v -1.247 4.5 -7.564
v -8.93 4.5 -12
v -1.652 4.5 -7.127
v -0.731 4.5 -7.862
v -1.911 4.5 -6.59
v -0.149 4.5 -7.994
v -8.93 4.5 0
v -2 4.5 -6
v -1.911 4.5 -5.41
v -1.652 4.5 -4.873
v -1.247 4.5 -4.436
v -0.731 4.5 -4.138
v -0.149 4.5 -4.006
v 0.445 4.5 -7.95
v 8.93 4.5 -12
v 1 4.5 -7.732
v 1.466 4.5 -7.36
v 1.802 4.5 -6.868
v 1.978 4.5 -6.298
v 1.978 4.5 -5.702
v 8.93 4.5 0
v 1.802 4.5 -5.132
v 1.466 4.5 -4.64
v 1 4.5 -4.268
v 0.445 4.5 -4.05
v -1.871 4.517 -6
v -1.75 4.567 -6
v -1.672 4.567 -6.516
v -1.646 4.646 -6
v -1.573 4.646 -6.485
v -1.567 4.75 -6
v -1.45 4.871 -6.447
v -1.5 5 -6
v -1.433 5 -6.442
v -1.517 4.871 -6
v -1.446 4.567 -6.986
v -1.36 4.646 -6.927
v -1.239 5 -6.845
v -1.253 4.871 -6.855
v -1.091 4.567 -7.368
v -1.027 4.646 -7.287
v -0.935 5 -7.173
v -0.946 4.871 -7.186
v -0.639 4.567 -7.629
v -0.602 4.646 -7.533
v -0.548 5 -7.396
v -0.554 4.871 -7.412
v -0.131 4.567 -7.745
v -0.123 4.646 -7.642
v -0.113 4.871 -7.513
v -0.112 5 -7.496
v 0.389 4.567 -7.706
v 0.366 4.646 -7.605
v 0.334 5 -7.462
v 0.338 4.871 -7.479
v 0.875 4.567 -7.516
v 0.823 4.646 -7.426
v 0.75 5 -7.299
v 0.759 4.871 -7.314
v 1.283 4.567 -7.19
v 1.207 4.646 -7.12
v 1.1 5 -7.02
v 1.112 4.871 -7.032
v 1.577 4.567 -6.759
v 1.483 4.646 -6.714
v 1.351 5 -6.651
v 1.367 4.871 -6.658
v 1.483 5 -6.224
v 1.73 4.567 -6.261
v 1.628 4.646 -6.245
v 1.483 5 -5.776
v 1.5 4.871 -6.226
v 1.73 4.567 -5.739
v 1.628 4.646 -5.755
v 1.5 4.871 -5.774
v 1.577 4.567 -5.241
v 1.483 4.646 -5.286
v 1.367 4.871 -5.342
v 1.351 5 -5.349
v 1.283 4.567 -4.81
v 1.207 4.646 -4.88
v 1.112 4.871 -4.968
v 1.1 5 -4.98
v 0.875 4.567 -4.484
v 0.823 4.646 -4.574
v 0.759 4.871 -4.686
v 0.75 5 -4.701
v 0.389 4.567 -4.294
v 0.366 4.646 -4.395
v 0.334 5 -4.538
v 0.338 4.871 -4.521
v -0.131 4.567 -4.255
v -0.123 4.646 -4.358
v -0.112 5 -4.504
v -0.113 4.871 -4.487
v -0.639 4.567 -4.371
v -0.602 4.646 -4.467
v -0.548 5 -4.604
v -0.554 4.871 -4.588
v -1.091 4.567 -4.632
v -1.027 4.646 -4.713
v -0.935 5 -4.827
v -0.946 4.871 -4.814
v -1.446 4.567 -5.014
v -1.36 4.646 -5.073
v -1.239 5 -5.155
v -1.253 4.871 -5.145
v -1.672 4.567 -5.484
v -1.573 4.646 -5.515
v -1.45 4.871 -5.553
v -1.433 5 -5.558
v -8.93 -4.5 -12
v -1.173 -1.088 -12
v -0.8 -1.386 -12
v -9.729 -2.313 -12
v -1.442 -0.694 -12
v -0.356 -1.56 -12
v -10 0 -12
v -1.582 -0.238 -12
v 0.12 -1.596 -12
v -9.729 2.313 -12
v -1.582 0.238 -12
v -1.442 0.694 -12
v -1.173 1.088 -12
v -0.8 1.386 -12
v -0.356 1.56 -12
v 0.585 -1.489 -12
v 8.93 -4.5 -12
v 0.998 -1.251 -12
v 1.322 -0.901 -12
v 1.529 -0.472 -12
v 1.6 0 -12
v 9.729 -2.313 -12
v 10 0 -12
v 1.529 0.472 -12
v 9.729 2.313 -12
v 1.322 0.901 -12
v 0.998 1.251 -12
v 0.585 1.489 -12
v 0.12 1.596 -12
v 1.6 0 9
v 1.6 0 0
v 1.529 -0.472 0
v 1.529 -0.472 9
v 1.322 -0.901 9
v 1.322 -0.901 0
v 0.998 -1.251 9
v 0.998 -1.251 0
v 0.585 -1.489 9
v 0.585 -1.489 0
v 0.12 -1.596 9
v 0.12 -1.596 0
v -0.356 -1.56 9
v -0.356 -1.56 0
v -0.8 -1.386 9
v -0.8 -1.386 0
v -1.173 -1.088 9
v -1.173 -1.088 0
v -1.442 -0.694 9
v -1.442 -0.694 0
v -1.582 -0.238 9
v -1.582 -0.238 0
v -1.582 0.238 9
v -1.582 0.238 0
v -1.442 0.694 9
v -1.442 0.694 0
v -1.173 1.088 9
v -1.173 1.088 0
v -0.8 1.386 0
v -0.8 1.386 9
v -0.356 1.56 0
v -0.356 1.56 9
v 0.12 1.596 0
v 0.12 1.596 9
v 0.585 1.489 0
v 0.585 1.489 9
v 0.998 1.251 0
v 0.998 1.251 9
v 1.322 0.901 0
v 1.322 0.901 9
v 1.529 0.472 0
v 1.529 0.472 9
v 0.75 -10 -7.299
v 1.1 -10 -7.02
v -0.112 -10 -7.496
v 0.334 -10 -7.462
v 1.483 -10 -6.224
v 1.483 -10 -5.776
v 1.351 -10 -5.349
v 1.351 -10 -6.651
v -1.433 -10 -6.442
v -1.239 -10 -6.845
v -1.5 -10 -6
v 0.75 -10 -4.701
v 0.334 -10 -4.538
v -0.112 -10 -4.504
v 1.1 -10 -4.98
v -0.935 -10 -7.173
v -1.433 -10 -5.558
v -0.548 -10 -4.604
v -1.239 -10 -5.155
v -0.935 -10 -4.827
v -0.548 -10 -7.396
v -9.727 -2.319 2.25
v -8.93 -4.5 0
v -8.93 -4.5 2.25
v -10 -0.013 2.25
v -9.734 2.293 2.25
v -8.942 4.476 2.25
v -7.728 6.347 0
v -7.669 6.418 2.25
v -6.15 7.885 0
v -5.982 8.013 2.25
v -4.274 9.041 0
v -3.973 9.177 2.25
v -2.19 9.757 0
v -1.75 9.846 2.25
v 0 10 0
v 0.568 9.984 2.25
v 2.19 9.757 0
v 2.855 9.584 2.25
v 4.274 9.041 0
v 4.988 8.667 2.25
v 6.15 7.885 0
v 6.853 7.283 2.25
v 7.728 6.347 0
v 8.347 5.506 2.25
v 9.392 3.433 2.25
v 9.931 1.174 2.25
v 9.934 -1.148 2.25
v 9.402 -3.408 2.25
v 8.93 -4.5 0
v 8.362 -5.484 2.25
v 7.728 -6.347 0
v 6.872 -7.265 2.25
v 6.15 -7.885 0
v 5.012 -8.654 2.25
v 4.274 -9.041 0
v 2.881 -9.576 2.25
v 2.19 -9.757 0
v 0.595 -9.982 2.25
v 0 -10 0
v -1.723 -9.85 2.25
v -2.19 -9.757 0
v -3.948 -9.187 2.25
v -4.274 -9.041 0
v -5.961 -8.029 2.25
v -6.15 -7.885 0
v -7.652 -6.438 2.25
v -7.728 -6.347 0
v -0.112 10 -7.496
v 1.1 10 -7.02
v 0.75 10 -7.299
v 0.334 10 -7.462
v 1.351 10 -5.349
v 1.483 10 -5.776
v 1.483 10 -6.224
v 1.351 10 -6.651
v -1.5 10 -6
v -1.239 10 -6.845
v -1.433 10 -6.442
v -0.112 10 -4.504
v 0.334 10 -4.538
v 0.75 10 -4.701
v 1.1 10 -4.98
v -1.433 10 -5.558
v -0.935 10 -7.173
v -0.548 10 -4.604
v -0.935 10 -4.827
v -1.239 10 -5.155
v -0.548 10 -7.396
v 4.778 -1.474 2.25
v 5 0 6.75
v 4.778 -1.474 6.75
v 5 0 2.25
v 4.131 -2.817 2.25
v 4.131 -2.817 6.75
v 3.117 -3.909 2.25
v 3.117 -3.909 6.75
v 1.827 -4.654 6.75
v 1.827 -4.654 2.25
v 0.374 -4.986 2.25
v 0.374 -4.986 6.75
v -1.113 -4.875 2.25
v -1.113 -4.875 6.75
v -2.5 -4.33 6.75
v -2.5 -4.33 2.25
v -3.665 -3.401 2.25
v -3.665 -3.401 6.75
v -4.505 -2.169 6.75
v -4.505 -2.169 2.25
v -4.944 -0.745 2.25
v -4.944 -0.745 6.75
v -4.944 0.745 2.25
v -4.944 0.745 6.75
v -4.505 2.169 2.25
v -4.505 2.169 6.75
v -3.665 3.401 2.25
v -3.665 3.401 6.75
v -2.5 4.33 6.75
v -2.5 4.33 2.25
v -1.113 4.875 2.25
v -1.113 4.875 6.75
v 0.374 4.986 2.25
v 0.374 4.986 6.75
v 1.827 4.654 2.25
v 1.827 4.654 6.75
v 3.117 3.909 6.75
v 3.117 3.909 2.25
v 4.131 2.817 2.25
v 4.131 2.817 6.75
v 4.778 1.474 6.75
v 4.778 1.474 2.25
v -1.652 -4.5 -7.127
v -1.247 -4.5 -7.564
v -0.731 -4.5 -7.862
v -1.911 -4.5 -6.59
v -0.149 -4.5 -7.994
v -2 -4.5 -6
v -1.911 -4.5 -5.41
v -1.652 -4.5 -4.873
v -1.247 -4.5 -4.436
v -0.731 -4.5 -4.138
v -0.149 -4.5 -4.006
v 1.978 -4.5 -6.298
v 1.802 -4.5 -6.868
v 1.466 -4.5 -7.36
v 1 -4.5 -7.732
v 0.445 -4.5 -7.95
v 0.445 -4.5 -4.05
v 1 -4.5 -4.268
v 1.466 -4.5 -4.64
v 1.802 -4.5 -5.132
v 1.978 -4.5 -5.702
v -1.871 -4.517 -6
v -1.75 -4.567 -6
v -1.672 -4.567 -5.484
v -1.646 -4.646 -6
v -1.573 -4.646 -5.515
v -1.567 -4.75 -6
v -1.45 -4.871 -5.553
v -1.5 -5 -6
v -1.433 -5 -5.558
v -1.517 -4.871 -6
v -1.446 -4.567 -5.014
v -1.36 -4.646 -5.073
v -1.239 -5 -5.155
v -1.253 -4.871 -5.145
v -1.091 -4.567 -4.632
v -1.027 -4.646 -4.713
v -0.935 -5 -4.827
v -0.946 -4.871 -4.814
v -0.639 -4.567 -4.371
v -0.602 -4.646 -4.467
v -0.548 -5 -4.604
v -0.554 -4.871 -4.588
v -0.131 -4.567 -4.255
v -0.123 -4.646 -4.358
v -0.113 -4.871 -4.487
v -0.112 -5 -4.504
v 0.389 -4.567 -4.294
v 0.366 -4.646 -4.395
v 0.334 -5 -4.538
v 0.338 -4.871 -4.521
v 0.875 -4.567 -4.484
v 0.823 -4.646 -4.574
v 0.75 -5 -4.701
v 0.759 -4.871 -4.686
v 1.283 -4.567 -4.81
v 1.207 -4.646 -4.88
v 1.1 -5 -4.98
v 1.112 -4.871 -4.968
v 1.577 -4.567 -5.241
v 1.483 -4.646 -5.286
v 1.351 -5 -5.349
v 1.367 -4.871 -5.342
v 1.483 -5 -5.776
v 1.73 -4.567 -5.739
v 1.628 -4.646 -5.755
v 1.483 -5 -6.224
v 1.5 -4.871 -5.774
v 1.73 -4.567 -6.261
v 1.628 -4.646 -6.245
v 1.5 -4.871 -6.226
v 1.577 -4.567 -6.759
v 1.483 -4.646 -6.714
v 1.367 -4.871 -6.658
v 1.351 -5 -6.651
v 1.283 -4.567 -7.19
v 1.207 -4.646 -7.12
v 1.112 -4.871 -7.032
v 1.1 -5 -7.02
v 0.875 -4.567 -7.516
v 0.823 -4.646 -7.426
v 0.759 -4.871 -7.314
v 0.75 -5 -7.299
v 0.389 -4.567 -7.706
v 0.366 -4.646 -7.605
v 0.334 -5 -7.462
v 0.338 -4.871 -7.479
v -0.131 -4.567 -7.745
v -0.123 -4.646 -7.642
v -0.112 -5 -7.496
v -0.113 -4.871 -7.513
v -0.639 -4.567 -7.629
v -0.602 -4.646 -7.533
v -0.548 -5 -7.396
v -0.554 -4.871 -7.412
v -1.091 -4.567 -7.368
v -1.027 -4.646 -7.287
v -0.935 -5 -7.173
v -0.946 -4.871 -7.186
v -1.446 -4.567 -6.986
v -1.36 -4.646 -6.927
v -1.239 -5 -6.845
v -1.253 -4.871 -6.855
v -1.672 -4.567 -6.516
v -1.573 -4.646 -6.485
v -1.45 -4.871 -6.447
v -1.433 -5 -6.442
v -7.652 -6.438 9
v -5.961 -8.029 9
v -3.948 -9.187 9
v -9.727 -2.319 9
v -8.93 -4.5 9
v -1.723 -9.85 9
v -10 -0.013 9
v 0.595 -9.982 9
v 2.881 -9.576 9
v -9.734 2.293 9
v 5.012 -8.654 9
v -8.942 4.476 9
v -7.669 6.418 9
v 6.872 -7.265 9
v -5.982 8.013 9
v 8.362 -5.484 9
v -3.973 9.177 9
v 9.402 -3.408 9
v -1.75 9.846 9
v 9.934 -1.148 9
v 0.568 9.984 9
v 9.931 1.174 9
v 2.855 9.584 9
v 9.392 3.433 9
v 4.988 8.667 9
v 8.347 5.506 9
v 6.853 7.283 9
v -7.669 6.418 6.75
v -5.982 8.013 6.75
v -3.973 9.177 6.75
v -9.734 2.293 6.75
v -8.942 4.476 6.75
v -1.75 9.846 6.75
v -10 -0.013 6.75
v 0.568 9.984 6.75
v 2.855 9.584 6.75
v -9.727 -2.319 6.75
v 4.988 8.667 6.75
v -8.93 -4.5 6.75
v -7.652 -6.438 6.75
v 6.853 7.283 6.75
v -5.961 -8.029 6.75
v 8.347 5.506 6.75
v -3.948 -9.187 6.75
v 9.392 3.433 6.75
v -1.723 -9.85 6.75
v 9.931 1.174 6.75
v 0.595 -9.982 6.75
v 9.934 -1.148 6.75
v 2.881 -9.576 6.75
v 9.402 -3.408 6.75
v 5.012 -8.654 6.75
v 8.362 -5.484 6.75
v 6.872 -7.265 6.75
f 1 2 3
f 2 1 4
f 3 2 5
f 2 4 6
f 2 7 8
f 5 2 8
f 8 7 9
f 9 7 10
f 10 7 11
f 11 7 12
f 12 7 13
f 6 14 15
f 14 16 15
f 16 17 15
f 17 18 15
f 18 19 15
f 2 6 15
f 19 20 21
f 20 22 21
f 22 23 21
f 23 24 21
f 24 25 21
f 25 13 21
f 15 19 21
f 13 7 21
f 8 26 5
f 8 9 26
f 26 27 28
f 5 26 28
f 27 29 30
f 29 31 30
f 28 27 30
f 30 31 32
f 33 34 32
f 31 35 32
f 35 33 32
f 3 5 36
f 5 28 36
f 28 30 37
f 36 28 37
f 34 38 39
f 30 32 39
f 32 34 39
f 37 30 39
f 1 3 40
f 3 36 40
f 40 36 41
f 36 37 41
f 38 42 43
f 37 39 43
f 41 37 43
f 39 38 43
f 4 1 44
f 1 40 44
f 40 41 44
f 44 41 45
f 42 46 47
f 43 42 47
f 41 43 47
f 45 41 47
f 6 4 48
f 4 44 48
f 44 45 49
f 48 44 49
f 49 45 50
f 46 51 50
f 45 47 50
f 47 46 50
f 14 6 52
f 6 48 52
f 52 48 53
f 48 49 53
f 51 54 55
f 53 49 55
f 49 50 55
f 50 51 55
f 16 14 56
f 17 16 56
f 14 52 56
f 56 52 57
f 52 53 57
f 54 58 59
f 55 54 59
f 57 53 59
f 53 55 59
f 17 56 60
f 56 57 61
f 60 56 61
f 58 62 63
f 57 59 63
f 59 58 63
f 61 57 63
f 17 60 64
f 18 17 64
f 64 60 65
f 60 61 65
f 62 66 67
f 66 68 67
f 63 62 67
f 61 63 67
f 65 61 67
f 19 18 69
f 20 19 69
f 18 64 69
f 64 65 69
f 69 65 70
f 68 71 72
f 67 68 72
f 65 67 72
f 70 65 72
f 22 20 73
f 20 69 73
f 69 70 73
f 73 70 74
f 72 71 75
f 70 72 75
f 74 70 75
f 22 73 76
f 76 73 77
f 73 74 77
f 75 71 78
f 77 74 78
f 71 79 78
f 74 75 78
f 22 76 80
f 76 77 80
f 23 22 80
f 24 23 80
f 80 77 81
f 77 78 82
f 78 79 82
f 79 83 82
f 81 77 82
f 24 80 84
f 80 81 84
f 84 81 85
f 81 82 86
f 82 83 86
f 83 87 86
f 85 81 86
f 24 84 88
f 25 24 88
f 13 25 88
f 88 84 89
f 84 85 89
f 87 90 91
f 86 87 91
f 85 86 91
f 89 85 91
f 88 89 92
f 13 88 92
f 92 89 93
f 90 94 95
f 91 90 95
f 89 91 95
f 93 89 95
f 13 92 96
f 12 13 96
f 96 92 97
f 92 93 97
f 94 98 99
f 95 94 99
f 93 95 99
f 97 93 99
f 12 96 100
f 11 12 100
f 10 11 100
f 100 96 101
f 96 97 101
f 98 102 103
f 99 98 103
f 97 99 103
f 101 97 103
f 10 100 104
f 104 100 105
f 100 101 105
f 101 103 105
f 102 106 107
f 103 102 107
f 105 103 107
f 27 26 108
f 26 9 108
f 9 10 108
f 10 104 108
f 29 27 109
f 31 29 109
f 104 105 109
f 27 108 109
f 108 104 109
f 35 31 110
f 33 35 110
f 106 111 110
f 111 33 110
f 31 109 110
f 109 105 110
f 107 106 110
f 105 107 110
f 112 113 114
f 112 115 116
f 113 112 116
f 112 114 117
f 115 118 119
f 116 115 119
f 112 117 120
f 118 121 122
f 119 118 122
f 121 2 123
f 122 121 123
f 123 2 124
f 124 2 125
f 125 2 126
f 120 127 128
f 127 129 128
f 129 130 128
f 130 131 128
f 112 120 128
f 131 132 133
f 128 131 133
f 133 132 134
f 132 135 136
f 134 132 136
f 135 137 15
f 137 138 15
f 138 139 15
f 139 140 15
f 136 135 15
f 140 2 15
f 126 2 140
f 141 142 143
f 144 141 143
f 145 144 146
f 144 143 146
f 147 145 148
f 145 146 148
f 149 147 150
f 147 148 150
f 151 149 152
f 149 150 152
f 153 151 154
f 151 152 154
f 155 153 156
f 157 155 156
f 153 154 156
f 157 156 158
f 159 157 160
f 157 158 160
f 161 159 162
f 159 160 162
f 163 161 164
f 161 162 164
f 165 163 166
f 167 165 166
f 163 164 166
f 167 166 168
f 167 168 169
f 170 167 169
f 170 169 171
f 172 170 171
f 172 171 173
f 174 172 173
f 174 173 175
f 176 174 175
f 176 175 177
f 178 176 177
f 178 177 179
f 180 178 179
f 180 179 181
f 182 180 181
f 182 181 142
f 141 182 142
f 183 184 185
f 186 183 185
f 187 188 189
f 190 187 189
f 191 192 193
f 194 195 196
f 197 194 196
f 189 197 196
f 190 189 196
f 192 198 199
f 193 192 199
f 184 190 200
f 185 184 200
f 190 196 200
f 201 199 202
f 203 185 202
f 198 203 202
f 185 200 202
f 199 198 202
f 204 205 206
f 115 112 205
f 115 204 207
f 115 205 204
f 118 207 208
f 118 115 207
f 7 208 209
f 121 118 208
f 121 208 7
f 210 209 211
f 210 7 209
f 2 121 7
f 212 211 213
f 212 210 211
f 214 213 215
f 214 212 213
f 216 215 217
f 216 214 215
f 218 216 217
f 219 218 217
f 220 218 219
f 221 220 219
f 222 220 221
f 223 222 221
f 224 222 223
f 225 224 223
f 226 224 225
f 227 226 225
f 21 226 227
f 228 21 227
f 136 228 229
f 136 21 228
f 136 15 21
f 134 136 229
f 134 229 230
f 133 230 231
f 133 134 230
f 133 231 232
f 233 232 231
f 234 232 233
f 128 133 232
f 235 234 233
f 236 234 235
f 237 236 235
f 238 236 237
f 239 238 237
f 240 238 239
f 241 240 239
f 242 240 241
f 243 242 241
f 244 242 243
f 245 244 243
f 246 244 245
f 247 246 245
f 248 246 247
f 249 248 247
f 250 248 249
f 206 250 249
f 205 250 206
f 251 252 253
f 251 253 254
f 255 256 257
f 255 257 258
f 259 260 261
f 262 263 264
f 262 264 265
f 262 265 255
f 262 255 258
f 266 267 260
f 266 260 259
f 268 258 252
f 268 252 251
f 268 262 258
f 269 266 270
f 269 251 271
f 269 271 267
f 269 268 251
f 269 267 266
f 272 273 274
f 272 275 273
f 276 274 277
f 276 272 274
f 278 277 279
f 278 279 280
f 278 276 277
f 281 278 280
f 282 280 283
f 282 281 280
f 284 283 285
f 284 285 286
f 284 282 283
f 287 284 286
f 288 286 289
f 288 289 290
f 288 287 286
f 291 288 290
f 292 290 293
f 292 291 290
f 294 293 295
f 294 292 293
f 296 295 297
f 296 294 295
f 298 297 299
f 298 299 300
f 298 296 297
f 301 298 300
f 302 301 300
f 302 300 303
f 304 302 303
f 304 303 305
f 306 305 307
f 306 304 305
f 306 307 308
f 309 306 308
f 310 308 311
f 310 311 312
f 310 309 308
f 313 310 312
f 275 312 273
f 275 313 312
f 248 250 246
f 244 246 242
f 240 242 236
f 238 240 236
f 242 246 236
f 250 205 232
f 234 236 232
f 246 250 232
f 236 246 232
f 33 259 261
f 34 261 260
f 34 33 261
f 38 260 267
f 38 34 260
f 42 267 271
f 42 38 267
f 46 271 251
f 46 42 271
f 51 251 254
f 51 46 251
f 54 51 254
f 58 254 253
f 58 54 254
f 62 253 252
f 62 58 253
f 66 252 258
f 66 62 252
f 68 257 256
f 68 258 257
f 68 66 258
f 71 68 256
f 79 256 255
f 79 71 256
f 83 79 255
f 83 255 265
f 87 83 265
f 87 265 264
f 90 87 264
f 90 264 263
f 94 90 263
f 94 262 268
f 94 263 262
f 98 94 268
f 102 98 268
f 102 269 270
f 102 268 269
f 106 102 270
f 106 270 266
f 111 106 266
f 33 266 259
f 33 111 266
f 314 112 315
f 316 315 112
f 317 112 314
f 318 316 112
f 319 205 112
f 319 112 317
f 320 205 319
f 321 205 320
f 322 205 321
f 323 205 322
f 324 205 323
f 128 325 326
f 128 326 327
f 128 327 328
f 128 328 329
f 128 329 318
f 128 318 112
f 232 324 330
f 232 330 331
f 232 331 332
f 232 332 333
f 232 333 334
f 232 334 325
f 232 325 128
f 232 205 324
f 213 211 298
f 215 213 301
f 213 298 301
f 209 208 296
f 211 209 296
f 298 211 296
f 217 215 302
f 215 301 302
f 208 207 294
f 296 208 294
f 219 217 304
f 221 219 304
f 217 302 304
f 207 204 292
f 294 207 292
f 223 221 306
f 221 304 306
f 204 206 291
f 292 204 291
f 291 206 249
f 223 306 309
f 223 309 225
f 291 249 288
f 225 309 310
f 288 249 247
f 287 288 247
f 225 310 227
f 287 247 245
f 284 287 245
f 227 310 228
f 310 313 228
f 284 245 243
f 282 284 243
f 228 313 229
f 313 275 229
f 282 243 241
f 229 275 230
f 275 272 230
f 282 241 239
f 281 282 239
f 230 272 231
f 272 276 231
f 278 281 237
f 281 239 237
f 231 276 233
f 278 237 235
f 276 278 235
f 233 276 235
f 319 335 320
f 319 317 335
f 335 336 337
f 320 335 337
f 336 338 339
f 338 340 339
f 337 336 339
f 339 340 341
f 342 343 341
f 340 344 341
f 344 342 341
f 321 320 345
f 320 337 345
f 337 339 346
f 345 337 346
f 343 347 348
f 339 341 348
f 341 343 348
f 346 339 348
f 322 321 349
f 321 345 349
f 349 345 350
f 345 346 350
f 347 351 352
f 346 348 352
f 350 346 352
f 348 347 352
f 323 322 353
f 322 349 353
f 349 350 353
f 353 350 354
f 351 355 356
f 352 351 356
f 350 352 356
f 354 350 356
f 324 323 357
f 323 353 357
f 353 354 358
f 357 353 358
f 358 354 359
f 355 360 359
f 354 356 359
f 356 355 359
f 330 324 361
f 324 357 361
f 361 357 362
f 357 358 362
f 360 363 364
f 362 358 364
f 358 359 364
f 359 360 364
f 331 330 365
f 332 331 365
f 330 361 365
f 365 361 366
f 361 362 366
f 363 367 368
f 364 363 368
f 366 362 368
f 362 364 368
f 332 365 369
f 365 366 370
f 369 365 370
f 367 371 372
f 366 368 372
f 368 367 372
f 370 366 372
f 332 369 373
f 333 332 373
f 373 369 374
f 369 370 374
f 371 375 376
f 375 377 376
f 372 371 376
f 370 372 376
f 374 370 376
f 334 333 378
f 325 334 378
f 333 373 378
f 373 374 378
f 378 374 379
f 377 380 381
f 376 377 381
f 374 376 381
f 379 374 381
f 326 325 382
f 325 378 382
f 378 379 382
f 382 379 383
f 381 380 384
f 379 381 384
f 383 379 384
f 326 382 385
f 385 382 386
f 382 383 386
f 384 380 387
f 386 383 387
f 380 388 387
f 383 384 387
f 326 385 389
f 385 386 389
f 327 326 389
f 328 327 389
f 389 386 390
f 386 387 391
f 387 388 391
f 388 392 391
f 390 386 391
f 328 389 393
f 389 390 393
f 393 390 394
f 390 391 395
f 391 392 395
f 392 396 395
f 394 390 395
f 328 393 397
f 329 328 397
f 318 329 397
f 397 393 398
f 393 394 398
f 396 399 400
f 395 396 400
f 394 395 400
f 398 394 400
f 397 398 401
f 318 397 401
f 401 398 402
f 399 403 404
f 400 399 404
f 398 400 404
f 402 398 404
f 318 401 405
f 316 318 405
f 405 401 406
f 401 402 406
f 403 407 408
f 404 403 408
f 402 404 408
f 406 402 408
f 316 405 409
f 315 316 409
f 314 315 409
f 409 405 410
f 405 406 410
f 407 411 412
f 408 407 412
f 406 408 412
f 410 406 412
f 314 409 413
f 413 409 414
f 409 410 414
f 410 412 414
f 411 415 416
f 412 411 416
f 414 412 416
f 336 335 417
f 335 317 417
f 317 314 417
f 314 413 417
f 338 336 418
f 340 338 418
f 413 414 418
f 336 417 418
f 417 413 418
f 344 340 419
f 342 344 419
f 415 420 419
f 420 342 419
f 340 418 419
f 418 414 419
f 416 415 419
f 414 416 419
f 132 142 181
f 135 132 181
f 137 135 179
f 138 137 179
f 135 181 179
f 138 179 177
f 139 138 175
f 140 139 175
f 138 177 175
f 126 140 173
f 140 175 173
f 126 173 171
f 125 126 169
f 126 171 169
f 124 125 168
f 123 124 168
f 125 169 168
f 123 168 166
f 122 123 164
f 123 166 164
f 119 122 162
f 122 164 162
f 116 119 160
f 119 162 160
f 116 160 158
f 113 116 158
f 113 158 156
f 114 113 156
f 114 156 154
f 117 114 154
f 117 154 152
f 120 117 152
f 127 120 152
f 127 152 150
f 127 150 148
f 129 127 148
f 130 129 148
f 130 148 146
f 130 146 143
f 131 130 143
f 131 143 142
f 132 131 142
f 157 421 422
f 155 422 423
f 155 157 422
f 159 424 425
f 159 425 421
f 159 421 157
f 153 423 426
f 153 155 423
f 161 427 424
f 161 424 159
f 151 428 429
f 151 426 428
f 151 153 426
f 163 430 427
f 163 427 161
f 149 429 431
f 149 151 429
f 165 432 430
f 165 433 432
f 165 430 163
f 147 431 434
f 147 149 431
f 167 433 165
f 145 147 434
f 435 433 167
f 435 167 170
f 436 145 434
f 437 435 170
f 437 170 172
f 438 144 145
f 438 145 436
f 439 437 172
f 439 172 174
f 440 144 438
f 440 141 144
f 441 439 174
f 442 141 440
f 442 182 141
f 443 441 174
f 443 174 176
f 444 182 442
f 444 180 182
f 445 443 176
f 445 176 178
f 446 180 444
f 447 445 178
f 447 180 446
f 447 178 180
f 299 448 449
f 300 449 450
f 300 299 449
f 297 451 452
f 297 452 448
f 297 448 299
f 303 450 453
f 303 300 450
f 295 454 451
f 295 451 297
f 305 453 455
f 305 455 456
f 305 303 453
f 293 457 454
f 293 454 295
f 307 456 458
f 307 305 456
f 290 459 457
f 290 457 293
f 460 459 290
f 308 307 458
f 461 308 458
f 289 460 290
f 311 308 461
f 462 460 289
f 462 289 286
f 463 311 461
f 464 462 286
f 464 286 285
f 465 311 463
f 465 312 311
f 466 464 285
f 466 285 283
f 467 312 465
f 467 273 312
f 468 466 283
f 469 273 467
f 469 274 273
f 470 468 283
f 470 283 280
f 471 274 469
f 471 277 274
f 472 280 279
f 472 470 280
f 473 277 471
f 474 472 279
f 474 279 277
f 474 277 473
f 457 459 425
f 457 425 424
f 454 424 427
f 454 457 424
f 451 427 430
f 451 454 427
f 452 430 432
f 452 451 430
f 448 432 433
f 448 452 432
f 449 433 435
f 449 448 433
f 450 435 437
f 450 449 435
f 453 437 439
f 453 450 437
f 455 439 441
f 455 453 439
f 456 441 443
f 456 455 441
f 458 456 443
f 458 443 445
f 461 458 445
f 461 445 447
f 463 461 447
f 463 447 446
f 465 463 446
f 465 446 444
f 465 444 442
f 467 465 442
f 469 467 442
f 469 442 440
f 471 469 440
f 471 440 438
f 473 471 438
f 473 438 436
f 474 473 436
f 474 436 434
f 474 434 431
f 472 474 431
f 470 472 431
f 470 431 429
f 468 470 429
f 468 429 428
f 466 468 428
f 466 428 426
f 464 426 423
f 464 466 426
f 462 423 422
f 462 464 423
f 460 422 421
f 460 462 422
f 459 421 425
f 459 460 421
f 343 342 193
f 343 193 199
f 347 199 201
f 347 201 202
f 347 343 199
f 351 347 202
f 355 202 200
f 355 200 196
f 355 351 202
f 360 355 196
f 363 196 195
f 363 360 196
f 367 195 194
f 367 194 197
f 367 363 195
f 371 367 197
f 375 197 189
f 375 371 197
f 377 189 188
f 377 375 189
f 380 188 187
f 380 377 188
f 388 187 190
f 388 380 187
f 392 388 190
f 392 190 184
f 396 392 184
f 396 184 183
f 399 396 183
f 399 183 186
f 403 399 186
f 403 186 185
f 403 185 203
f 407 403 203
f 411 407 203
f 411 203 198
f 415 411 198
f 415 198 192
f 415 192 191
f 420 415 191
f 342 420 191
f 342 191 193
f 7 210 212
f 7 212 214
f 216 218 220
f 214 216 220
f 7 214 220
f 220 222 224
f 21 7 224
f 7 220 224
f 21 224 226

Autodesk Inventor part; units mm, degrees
ref_plane "YZ Plane" through (0, 0, 0) normal (1, 0, 0) x (0, 1, 0)
ref_plane "XZ Plane" through (0, 0, 0) normal (0, 1, 0) x (-1, 0, 0)
ref_plane "XY Plane" through (0, 0, 0) normal (0, 0, 1) x (1, 0, 0)
sketch "Sketch1" plane through (0, 0, 0) normal (0, 0, 1) x (1, 0, 0)
  arc A0 (-8.9303, 4.5) -> (-8.9303, -4.5) centre (0, 0) ccw
  circle A1 centre (0, 0) radius 4.5 construction
  line L0 (-8.9303, 4.5) -> (8.9303, 4.5)
  line L1 (-8.9303, -4.5) -> (8.9303, -4.5)
  arc A2 (8.9303, 4.5) -> (-8.9303, 4.5) centre (0, 0) ccw
  arc A3 (8.9303, -4.5) -> (8.9303, 4.5) centre (0, 0) ccw
  arc A4 (-8.9303, -4.5) -> (8.9303, -4.5) centre (0, 0) ccw
  dimension "d0" = 20
  dimension "d1" = 9
extrude "Extrusion1" add sketch "Sketch1" against normal blind 12 contours L0 A3 L1 A0
extrude "Extrusion2" add sketch "Sketch1" along normal blind 9
sketch "Sketch2" plane through (0, 0, 0) normal (0, 1, 0) x (-1, 0, 0)
  circle A0 centre (0, -6) radius 1.5
  line L0 (0, 0) -> (0, -6) construction
  dimension "d6" = 3
  dimension "d7" = 6
extrude "Extrusion3" add sketch "Sketch2" along normal mid plane 20
sketch "Sketch3" plane through (0, 0, 0) normal (0, 1, 0) x (-1, 0, 0)
  line L0 (10, 9) -> (-10, 9) construction
  line L1 (8.9303, 0) -> (-8.9303, 0) construction
  line L2 (0, 9) -> (0, 0) construction
  line L3 (-8.9303, 0) -> (8.9303, 0) construction
  line L4 (0, 4.5) -> (-10, 4.5) construction
  line L5 (-10, 9) -> (-10, -12) construction
  line L6 (-5, 2.25) -> (-10, 2.25)
  line L7 (-10, 2.25) -> (-10, 6.75)
  line L8 (-10, 6.75) -> (-5, 6.75)
  line L9 (-5, 6.75) -> (-5, 2.25)
  line L10 (-5, 2.25) -> (-10, 6.75) construction
  line L11 (-10, 2.25) -> (-5, 6.75) construction
  point P0 (-7.5, 4.5)
  dimension "d10" = 4.5
  dimension "d11" = 10
revolve "Revolution1" cut sketch "Sketch3" angle 360 about axis through (0, 0, 9) along (0, 0, -1)
sketch "Sketch4" plane through (0, 0, 0) normal (0, 0, 1) x (1, 0, 0)
  circle A0 centre (0, 0) radius 1.6
  dimension "d22" = 3.2
extrude "Extrusion4" cut sketch "Sketch4" along normal through all both and the other way through all
chamfer "Chamfer1" [suppressed]
fillet "Fillet1" radius 0.5 2 edges at (1.5, -4.5, -6) (1.5, 4.5, -6)
properties part number "slider-1"
